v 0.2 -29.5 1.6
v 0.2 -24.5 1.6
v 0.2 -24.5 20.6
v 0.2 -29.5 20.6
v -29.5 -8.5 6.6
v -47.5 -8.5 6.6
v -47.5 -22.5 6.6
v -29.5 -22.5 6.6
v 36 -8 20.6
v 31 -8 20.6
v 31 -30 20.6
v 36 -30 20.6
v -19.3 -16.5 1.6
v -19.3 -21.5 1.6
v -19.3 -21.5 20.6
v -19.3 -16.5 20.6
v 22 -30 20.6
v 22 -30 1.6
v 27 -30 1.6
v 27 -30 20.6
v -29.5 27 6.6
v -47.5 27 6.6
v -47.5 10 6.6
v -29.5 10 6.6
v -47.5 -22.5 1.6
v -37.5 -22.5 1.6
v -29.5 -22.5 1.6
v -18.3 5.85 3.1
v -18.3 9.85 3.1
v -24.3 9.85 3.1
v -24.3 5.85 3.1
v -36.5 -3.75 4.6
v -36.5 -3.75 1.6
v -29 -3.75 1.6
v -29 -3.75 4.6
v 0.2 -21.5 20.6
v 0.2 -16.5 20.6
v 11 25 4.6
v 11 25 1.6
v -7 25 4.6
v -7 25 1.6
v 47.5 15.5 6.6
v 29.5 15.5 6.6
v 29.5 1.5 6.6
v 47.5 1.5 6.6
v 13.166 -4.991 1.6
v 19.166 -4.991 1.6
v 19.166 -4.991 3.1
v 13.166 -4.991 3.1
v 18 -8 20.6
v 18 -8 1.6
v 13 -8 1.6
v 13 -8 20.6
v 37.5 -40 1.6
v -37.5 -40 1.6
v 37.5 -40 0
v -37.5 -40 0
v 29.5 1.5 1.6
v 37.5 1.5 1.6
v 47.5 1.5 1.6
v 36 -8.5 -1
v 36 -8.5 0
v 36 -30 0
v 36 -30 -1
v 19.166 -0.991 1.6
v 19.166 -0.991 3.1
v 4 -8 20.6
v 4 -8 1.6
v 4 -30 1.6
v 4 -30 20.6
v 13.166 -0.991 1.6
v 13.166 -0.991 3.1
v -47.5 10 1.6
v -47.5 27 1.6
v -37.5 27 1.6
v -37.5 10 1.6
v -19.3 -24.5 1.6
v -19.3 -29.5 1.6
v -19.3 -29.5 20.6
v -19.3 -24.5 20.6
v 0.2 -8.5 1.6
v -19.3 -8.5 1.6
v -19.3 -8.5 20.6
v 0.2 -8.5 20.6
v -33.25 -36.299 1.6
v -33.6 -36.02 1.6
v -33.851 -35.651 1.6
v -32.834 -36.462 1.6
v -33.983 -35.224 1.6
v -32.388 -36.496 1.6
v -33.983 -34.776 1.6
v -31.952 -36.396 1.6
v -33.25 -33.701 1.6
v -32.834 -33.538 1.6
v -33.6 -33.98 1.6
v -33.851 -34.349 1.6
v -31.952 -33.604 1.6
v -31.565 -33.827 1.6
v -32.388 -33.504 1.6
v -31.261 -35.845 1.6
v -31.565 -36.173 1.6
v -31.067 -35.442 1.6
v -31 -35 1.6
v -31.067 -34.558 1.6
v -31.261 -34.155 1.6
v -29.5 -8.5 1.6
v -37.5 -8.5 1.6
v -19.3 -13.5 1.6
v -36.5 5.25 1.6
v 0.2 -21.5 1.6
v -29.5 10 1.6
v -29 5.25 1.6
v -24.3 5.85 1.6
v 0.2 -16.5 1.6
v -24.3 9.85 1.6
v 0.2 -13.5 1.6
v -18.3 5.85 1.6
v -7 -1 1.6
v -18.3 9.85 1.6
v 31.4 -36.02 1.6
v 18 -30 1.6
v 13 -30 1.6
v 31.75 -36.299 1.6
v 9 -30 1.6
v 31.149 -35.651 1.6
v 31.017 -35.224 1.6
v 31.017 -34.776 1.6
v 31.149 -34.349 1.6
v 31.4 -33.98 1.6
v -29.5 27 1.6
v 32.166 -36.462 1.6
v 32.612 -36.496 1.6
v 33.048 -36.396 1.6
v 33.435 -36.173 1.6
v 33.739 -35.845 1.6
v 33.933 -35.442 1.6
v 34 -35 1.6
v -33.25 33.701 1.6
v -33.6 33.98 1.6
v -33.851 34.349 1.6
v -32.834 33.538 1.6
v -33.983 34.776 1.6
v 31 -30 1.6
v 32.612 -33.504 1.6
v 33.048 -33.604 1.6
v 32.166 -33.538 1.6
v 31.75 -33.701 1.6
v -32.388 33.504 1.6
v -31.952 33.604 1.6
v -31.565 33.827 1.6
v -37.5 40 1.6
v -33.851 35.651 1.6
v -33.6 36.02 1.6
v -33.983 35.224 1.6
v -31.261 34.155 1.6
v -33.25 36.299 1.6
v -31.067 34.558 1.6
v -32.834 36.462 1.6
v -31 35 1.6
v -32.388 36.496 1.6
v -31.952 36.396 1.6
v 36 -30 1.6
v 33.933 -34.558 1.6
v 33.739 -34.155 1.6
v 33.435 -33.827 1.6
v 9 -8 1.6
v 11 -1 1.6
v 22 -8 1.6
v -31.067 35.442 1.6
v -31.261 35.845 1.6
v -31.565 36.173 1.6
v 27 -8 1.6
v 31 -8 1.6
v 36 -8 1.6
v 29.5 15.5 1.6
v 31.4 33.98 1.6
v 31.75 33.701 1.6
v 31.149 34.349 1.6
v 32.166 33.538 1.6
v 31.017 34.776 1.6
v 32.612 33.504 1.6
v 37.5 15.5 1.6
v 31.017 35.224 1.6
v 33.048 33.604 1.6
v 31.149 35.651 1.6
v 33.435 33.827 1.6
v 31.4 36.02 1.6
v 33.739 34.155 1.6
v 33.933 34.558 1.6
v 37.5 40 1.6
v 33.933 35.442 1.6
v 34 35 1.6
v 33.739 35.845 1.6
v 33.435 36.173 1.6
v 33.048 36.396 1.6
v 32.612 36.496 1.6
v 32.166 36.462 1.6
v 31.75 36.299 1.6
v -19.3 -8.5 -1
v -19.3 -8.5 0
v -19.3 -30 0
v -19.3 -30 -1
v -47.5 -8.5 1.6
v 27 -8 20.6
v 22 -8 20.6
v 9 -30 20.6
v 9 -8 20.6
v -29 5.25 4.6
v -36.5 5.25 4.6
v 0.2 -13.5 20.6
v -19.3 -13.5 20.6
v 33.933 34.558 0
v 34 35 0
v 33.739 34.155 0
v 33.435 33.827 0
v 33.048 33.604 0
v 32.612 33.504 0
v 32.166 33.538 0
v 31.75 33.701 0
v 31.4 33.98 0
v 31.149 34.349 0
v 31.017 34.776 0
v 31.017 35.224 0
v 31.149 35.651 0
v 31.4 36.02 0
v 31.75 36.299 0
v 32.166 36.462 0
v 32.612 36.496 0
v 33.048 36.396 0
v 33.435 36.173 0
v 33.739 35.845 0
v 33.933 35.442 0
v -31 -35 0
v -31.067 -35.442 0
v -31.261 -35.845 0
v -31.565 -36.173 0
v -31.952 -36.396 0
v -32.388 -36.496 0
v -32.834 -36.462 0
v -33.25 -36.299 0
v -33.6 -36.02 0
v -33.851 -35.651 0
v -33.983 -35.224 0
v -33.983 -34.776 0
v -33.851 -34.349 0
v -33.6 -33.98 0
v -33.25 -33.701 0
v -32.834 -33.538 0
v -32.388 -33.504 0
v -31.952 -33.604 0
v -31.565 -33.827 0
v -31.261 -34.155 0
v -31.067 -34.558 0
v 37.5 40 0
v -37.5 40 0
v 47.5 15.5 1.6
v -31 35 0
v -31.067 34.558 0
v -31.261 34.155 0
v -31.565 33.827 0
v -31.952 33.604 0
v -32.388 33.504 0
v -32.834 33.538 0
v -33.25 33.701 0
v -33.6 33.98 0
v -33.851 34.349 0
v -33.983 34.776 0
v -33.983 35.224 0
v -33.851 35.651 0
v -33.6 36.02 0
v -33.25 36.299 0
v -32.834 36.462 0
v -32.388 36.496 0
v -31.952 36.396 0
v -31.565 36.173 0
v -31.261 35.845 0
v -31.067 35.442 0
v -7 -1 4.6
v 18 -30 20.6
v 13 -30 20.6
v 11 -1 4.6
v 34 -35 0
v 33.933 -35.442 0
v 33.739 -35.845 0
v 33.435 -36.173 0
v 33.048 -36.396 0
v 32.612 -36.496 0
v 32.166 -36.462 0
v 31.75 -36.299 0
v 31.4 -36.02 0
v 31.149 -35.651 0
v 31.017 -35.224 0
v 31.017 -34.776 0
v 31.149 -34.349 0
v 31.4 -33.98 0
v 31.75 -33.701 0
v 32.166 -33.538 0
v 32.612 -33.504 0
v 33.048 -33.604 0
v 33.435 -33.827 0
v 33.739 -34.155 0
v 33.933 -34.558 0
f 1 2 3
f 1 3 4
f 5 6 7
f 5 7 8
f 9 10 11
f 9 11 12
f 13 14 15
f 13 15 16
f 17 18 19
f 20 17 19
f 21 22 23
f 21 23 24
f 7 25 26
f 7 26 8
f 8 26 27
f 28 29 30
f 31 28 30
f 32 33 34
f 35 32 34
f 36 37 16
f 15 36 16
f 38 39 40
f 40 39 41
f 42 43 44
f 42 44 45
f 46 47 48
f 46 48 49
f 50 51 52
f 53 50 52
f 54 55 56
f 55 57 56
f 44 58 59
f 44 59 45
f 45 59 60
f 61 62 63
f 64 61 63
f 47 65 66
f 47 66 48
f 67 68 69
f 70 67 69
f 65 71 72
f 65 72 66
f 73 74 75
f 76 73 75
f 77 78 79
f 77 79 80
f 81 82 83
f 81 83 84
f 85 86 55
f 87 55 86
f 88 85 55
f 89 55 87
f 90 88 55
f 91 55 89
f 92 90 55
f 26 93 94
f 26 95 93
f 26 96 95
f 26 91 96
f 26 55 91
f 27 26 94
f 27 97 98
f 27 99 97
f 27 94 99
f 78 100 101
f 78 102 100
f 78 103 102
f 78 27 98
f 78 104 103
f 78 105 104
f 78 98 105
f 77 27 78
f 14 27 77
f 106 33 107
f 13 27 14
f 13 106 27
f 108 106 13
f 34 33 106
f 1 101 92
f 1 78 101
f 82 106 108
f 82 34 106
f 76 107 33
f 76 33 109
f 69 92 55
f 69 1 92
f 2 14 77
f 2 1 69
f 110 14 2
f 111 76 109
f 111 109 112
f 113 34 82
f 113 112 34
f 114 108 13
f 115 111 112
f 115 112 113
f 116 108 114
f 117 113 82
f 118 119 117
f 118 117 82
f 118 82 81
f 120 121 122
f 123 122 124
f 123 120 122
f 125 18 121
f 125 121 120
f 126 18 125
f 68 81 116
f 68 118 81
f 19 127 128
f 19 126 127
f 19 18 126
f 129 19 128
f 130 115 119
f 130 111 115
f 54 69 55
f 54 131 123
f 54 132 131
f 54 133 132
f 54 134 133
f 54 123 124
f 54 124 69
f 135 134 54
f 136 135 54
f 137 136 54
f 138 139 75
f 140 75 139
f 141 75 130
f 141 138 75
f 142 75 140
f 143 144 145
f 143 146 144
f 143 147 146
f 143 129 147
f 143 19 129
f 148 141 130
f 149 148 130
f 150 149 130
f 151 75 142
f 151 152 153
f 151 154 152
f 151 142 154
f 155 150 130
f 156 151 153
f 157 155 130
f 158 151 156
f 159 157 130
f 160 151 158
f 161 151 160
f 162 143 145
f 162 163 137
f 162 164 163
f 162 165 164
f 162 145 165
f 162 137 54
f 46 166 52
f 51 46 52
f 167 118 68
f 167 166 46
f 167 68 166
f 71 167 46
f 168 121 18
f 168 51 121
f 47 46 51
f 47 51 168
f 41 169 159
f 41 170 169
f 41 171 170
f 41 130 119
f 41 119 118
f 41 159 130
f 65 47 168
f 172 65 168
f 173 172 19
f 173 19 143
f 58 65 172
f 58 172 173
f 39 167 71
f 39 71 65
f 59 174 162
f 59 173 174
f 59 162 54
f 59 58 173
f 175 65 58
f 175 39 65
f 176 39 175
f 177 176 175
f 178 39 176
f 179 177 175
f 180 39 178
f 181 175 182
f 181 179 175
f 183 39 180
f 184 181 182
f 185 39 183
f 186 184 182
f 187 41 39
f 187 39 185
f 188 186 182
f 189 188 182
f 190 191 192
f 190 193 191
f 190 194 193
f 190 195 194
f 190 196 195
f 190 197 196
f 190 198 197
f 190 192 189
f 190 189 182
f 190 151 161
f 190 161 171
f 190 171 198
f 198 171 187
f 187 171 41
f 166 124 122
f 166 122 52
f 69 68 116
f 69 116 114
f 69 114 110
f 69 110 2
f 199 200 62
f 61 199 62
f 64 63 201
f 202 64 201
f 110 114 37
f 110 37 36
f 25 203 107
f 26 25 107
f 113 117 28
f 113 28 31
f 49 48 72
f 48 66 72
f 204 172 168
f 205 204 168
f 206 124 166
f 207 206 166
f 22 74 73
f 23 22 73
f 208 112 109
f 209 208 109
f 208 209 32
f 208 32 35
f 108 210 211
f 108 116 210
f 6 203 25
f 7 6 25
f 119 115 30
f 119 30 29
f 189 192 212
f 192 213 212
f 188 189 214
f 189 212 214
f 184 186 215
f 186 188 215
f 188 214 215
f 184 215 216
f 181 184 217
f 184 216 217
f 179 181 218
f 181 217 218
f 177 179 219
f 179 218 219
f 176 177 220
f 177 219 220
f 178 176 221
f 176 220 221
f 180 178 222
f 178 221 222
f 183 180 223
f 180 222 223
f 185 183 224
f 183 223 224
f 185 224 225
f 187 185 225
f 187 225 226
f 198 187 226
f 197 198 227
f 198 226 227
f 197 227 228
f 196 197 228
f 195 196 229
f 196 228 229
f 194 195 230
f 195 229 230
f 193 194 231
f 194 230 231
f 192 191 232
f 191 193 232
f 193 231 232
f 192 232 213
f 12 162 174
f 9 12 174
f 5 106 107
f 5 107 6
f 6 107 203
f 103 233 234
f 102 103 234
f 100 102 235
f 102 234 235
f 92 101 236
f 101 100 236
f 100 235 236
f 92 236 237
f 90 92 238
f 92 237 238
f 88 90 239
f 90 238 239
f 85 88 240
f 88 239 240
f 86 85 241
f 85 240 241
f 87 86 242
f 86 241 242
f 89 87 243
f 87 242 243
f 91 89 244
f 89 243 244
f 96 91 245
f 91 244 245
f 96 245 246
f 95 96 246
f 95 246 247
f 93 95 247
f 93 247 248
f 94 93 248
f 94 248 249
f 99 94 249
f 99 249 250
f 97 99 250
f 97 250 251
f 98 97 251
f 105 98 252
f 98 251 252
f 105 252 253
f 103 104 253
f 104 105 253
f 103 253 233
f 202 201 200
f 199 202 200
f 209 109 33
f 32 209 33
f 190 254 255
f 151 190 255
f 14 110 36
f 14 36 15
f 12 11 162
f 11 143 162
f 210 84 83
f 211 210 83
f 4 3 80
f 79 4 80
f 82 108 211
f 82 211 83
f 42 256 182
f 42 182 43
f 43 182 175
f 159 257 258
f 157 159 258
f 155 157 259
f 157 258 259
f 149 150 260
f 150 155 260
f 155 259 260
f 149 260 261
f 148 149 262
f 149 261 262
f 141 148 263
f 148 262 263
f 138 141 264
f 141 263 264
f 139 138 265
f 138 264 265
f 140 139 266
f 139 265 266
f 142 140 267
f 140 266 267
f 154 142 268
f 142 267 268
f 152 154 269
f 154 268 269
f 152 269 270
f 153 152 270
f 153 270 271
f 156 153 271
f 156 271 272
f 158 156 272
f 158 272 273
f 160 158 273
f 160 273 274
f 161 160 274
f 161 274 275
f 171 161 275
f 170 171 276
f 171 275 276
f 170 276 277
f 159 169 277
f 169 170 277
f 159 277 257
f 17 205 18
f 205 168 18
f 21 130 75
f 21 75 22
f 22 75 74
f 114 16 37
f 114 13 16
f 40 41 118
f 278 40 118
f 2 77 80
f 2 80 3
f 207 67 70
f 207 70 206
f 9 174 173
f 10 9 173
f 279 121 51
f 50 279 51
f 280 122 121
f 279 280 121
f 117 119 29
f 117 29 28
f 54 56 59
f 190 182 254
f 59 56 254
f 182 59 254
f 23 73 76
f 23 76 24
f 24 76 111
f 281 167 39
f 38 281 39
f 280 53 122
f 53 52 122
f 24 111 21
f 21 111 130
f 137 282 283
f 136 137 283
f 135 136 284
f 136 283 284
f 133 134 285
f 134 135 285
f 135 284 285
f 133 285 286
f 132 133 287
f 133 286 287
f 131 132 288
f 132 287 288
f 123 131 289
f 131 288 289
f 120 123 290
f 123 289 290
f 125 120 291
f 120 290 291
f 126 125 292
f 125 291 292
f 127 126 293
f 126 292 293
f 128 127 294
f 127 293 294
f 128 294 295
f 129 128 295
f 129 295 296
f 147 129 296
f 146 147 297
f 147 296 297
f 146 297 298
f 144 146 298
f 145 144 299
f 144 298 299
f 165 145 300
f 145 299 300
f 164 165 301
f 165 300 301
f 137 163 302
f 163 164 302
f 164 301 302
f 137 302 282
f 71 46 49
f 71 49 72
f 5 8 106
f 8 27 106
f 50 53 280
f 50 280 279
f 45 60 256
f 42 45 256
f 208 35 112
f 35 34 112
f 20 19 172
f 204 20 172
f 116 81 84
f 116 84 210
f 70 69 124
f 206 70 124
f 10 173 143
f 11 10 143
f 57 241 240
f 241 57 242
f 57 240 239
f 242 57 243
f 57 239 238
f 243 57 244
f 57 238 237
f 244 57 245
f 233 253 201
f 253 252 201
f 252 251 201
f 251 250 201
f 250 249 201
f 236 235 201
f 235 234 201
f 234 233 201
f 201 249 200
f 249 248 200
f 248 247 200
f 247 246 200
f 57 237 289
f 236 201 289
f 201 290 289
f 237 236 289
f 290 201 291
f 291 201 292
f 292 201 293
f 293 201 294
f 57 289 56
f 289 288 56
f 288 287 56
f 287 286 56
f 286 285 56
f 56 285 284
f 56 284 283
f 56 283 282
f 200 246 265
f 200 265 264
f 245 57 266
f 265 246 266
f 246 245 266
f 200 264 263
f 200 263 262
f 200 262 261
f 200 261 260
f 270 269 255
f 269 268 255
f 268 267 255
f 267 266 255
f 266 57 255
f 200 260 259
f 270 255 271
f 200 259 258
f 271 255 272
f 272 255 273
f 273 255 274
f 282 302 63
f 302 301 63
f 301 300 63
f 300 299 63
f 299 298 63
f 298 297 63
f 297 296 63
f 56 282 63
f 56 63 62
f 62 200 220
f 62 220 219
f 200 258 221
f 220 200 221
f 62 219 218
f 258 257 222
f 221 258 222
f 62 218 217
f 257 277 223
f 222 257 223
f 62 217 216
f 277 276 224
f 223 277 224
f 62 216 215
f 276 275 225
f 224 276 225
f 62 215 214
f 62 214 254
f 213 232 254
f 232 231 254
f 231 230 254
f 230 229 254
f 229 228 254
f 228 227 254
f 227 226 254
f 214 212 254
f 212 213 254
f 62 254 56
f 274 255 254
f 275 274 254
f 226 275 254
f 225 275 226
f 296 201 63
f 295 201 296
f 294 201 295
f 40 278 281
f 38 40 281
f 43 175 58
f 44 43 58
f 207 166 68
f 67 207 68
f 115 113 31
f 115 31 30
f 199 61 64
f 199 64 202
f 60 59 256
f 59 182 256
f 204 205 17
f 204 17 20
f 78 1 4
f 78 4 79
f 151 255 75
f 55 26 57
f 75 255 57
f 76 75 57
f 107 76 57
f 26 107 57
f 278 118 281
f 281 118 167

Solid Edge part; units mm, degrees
sketch "Sketch1" plane through (0, 0, 0) normal (0, 0, 1) x (1, 0, 0)
  circle A0 centre (32.5, 35) radius 1.5
  line L0 (37.5, 40) -> (-37.5, 40)
  line L1 (-37.5, 40) -> (-37.5, -40)
  line L2 (-37.5, -40) -> (37.5, -40)
  line L3 (37.5, -40) -> (37.5, 40)
  circle A1 centre (-32.5, -35) radius 1.5
  circle A2 centre (-32.5, 35) radius 1.5
  circle A3 centre (32.5, -35) radius 1.5
  dimension "D1" = 80
  dimension "D2" = 75
  dimension "D3" = 3
  dimension "D4" = 70
  dimension "D5" = 65
extrude "Protrusion1" add sketch "Sketch1" along normal blind 1.6
sketch "Sketch2" plane through (0, 0, 1.6) normal (0, 0, 1) x (1, 0, 0)
  line L0 (0.2, -24.5) -> (0.2, -29.5)
  line L1 (0.2, -29.5) -> (-19.3, -29.5)
  line L2 (-19.3, -29.5) -> (-19.3, -24.5)
  line L3 (-19.3, -24.5) -> (0.2, -24.5)
  line L4 (0.2, -16.5) -> (0.2, -21.5)
  line L5 (0.2, -21.5) -> (-19.3, -21.5)
  line L6 (-19.3, -21.5) -> (-19.3, -16.5)
  line L7 (-19.3, -16.5) -> (0.2, -16.5)
  line L8 (0.2, -8.5) -> (0.2, -13.5)
  line L9 (0.2, -13.5) -> (-19.3, -13.5)
  line L10 (-19.3, -13.5) -> (-19.3, -8.5)
  line L11 (-19.3, -8.5) -> (0.2, -8.5)
  line L12 (9, -8) -> (4, -8)
  line L13 (4, -8) -> (4, -30)
  line L14 (4, -30) -> (9, -30)
  line L15 (9, -30) -> (9, -8)
  line L16 (18, -8) -> (13, -8)
  line L17 (13, -8) -> (13, -30)
  line L18 (13, -30) -> (18, -30)
  line L19 (18, -30) -> (18, -8)
  line L20 (27, -8) -> (22, -8)
  line L21 (22, -8) -> (22, -30)
  line L22 (22, -30) -> (27, -30)
  line L23 (27, -30) -> (27, -8)
  line L24 (31, -8) -> (31, -30)
  line L25 (31, -30) -> (36, -30)
  line L26 (36, -30) -> (36, -8)
  line L27 (36, -8) -> (31, -8)
  dimension "D1" = 18
  dimension "D2" = 14
  dimension "D3" = 5
  dimension "D4" = 22
  dimension "D5" = 19.5
  dimension "D6" = 5
  dimension "D7" = 27
  dimension "D8" = 1.5
  dimension "D9" = 10
  dimension "D10" = 3.8
  dimension "D11" = 3
  dimension "D12" = 10.5
  dimension "D13" = 10
  dimension "D14" = 24.5
  dimension "D15" = 18
  dimension "D16" = 14
  dimension "D17" = 10
  dimension "D18" = 17.5
  dimension "D19" = 17
  dimension "D20" = 18
  dimension "D21" = 10
  dimension "D22" = 13
  dimension "D23" = 9
  dimension "D24" = 7.5
  dimension "D25" = 1
  dimension "D26" = 26
  dimension "D27" = 18
  dimension "D28" = 15
  dimension "D29" = 26.5
  dimension "D30" = 6
  dimension "D31" = 4
  dimension "D32" = 6
  dimension "D33" = 4
extrude "ExtrudedProtrusion_2" add sketch "Sketch2" along normal blind 19
sketch "Sketch3" plane through (0, 0, 1.6) normal (0, 0, 1) x (1, 0, 0)
  line L0 (-36.5, 5.25) -> (-36.5, -3.75)
  line L1 (-36.5, -3.75) -> (-29, -3.75)
  line L2 (-29, -3.75) -> (-29, 5.25)
  line L3 (-29, 5.25) -> (-36.5, 5.25)
  line L4 (11, 25) -> (-7, 25)
  line L5 (-7, 25) -> (-7, -1)
  line L6 (-7, -1) -> (11, -1)
  line L7 (11, -1) -> (11, 25)
  dimension "D1" = 18
  dimension "D2" = 14
  dimension "D3" = 5
  dimension "D4" = 22
  dimension "D5" = 19.5
  dimension "D6" = 5
  dimension "D7" = 27
  dimension "D8" = 1.5
  dimension "D9" = 10
  dimension "D10" = 3.8
  dimension "D11" = 3
  dimension "D12" = 10.5
  dimension "D13" = 10
  dimension "D14" = 24.5
  dimension "D15" = 18
  dimension "D16" = 14
  dimension "D17" = 10
  dimension "D18" = 17.5
  dimension "D19" = 17
  dimension "D20" = 18
  dimension "D21" = 10
  dimension "D22" = 13
  dimension "D23" = 9
  dimension "D24" = 7.5
  dimension "D25" = 1
  dimension "D26" = 26
  dimension "D27" = 18
  dimension "D28" = 15
  dimension "D29" = 26.5
  dimension "D30" = 6
  dimension "D31" = 4
  dimension "D32" = 6
  dimension "D33" = 4
extrude "ExtrudedProtrusion_3" add sketch "Sketch3" along normal blind 3
sketch "Sketch4" plane through (0, 0, 1.6) normal (0, 0, 1) x (1, 0, 0)
  line L0 (-29.5, -8.5) -> (-47.5, -8.5)
  line L1 (-47.5, -8.5) -> (-47.5, -22.5)
  line L2 (-47.5, -22.5) -> (-29.5, -22.5)
  line L3 (-29.5, -22.5) -> (-29.5, -8.5)
  line L4 (-47.5, 10) -> (-29.5, 10)
  line L5 (-29.5, 10) -> (-29.5, 27)
  line L6 (-29.5, 27) -> (-47.5, 27)
  line L7 (-47.5, 27) -> (-47.5, 10)
  line L8 (47.5, 15.5) -> (29.5, 15.5)
  line L9 (29.5, 15.5) -> (29.5, 1.5)
  line L10 (29.5, 1.5) -> (47.5, 1.5)
  line L11 (47.5, 1.5) -> (47.5, 15.5)
  dimension "D1" = 18
  dimension "D2" = 14
  dimension "D3" = 5
  dimension "D4" = 22
  dimension "D5" = 19.5
  dimension "D6" = 5
  dimension "D7" = 27
  dimension "D8" = 1.5
  dimension "D9" = 10
  dimension "D10" = 3.8
  dimension "D11" = 3
  dimension "D12" = 10.5
  dimension "D13" = 10
  dimension "D14" = 24.5
  dimension "D15" = 18
  dimension "D16" = 14
  dimension "D17" = 10
  dimension "D18" = 17.5
  dimension "D19" = 17
  dimension "D20" = 18
  dimension "D21" = 10
  dimension "D22" = 13
  dimension "D23" = 9
  dimension "D24" = 7.5
  dimension "D25" = 1
  dimension "D26" = 26
  dimension "D27" = 18
  dimension "D28" = 15
  dimension "D29" = 26.5
  dimension "D30" = 6
  dimension "D31" = 4
  dimension "D32" = 6
  dimension "D33" = 4
extrude "ExtrudedProtrusion_4" add sketch "Sketch4" along normal blind 5
sketch "Sketch5" plane through (0, 0, 1.6) normal (0, 0, 1) x (1, 0, 0)
  line L0 (-18.2995, 5.8505) -> (-24.2995, 5.8505)
  line L1 (-24.2995, 5.8505) -> (-24.2995, 9.8505)
  line L2 (-24.2995, 9.8505) -> (-18.2995, 9.8505)
  line L3 (-18.2995, 9.8505) -> (-18.2995, 5.8505)
  line L4 (13.1657, -4.9907) -> (13.1657, -0.9907)
  line L5 (13.1657, -0.9907) -> (19.1657, -0.9907)
  line L6 (19.1657, -0.9907) -> (19.1657, -4.9907)
  line L7 (19.1657, -4.9907) -> (13.1657, -4.9907)
  dimension "D1" = 18
  dimension "D2" = 14
  dimension "D3" = 5
  dimension "D4" = 22
  dimension "D5" = 19.5
  dimension "D6" = 5
  dimension "D7" = 27
  dimension "D8" = 1.5
  dimension "D9" = 10
  dimension "D10" = 3.8
  dimension "D11" = 3
  dimension "D12" = 10.5
  dimension "D13" = 10
  dimension "D14" = 24.5
  dimension "D15" = 18
  dimension "D16" = 14
  dimension "D17" = 10
  dimension "D18" = 17.5
  dimension "D19" = 17
  dimension "D20" = 18
  dimension "D21" = 10
  dimension "D22" = 13
  dimension "D23" = 9
  dimension "D24" = 7.5
  dimension "D25" = 1
  dimension "D26" = 26
  dimension "D27" = 18
  dimension "D28" = 15
  dimension "D29" = 26.5
  dimension "D30" = 6
  dimension "D31" = 4
  dimension "D32" = 6
  dimension "D33" = 4
extrude "ExtrudedProtrusion_5" add sketch "Sketch5" along normal blind 1.5
sketch "Sketch6" plane through (0, 0, 0) normal (0, 0, -1) x (-1, 0, 0)
  line L0 (-36, -8.5) -> (-36, -30)
  line L1 (-36, -30) -> (19.3, -30)
  line L2 (19.3, -30) -> (19.3, -8.5)
  line L3 (19.3, -8.5) -> (-36, -8.5)
extrude "ExtrudedProtrusion_6" add sketch "Sketch6" along normal blind 1
properties material "Polycarbonate"
